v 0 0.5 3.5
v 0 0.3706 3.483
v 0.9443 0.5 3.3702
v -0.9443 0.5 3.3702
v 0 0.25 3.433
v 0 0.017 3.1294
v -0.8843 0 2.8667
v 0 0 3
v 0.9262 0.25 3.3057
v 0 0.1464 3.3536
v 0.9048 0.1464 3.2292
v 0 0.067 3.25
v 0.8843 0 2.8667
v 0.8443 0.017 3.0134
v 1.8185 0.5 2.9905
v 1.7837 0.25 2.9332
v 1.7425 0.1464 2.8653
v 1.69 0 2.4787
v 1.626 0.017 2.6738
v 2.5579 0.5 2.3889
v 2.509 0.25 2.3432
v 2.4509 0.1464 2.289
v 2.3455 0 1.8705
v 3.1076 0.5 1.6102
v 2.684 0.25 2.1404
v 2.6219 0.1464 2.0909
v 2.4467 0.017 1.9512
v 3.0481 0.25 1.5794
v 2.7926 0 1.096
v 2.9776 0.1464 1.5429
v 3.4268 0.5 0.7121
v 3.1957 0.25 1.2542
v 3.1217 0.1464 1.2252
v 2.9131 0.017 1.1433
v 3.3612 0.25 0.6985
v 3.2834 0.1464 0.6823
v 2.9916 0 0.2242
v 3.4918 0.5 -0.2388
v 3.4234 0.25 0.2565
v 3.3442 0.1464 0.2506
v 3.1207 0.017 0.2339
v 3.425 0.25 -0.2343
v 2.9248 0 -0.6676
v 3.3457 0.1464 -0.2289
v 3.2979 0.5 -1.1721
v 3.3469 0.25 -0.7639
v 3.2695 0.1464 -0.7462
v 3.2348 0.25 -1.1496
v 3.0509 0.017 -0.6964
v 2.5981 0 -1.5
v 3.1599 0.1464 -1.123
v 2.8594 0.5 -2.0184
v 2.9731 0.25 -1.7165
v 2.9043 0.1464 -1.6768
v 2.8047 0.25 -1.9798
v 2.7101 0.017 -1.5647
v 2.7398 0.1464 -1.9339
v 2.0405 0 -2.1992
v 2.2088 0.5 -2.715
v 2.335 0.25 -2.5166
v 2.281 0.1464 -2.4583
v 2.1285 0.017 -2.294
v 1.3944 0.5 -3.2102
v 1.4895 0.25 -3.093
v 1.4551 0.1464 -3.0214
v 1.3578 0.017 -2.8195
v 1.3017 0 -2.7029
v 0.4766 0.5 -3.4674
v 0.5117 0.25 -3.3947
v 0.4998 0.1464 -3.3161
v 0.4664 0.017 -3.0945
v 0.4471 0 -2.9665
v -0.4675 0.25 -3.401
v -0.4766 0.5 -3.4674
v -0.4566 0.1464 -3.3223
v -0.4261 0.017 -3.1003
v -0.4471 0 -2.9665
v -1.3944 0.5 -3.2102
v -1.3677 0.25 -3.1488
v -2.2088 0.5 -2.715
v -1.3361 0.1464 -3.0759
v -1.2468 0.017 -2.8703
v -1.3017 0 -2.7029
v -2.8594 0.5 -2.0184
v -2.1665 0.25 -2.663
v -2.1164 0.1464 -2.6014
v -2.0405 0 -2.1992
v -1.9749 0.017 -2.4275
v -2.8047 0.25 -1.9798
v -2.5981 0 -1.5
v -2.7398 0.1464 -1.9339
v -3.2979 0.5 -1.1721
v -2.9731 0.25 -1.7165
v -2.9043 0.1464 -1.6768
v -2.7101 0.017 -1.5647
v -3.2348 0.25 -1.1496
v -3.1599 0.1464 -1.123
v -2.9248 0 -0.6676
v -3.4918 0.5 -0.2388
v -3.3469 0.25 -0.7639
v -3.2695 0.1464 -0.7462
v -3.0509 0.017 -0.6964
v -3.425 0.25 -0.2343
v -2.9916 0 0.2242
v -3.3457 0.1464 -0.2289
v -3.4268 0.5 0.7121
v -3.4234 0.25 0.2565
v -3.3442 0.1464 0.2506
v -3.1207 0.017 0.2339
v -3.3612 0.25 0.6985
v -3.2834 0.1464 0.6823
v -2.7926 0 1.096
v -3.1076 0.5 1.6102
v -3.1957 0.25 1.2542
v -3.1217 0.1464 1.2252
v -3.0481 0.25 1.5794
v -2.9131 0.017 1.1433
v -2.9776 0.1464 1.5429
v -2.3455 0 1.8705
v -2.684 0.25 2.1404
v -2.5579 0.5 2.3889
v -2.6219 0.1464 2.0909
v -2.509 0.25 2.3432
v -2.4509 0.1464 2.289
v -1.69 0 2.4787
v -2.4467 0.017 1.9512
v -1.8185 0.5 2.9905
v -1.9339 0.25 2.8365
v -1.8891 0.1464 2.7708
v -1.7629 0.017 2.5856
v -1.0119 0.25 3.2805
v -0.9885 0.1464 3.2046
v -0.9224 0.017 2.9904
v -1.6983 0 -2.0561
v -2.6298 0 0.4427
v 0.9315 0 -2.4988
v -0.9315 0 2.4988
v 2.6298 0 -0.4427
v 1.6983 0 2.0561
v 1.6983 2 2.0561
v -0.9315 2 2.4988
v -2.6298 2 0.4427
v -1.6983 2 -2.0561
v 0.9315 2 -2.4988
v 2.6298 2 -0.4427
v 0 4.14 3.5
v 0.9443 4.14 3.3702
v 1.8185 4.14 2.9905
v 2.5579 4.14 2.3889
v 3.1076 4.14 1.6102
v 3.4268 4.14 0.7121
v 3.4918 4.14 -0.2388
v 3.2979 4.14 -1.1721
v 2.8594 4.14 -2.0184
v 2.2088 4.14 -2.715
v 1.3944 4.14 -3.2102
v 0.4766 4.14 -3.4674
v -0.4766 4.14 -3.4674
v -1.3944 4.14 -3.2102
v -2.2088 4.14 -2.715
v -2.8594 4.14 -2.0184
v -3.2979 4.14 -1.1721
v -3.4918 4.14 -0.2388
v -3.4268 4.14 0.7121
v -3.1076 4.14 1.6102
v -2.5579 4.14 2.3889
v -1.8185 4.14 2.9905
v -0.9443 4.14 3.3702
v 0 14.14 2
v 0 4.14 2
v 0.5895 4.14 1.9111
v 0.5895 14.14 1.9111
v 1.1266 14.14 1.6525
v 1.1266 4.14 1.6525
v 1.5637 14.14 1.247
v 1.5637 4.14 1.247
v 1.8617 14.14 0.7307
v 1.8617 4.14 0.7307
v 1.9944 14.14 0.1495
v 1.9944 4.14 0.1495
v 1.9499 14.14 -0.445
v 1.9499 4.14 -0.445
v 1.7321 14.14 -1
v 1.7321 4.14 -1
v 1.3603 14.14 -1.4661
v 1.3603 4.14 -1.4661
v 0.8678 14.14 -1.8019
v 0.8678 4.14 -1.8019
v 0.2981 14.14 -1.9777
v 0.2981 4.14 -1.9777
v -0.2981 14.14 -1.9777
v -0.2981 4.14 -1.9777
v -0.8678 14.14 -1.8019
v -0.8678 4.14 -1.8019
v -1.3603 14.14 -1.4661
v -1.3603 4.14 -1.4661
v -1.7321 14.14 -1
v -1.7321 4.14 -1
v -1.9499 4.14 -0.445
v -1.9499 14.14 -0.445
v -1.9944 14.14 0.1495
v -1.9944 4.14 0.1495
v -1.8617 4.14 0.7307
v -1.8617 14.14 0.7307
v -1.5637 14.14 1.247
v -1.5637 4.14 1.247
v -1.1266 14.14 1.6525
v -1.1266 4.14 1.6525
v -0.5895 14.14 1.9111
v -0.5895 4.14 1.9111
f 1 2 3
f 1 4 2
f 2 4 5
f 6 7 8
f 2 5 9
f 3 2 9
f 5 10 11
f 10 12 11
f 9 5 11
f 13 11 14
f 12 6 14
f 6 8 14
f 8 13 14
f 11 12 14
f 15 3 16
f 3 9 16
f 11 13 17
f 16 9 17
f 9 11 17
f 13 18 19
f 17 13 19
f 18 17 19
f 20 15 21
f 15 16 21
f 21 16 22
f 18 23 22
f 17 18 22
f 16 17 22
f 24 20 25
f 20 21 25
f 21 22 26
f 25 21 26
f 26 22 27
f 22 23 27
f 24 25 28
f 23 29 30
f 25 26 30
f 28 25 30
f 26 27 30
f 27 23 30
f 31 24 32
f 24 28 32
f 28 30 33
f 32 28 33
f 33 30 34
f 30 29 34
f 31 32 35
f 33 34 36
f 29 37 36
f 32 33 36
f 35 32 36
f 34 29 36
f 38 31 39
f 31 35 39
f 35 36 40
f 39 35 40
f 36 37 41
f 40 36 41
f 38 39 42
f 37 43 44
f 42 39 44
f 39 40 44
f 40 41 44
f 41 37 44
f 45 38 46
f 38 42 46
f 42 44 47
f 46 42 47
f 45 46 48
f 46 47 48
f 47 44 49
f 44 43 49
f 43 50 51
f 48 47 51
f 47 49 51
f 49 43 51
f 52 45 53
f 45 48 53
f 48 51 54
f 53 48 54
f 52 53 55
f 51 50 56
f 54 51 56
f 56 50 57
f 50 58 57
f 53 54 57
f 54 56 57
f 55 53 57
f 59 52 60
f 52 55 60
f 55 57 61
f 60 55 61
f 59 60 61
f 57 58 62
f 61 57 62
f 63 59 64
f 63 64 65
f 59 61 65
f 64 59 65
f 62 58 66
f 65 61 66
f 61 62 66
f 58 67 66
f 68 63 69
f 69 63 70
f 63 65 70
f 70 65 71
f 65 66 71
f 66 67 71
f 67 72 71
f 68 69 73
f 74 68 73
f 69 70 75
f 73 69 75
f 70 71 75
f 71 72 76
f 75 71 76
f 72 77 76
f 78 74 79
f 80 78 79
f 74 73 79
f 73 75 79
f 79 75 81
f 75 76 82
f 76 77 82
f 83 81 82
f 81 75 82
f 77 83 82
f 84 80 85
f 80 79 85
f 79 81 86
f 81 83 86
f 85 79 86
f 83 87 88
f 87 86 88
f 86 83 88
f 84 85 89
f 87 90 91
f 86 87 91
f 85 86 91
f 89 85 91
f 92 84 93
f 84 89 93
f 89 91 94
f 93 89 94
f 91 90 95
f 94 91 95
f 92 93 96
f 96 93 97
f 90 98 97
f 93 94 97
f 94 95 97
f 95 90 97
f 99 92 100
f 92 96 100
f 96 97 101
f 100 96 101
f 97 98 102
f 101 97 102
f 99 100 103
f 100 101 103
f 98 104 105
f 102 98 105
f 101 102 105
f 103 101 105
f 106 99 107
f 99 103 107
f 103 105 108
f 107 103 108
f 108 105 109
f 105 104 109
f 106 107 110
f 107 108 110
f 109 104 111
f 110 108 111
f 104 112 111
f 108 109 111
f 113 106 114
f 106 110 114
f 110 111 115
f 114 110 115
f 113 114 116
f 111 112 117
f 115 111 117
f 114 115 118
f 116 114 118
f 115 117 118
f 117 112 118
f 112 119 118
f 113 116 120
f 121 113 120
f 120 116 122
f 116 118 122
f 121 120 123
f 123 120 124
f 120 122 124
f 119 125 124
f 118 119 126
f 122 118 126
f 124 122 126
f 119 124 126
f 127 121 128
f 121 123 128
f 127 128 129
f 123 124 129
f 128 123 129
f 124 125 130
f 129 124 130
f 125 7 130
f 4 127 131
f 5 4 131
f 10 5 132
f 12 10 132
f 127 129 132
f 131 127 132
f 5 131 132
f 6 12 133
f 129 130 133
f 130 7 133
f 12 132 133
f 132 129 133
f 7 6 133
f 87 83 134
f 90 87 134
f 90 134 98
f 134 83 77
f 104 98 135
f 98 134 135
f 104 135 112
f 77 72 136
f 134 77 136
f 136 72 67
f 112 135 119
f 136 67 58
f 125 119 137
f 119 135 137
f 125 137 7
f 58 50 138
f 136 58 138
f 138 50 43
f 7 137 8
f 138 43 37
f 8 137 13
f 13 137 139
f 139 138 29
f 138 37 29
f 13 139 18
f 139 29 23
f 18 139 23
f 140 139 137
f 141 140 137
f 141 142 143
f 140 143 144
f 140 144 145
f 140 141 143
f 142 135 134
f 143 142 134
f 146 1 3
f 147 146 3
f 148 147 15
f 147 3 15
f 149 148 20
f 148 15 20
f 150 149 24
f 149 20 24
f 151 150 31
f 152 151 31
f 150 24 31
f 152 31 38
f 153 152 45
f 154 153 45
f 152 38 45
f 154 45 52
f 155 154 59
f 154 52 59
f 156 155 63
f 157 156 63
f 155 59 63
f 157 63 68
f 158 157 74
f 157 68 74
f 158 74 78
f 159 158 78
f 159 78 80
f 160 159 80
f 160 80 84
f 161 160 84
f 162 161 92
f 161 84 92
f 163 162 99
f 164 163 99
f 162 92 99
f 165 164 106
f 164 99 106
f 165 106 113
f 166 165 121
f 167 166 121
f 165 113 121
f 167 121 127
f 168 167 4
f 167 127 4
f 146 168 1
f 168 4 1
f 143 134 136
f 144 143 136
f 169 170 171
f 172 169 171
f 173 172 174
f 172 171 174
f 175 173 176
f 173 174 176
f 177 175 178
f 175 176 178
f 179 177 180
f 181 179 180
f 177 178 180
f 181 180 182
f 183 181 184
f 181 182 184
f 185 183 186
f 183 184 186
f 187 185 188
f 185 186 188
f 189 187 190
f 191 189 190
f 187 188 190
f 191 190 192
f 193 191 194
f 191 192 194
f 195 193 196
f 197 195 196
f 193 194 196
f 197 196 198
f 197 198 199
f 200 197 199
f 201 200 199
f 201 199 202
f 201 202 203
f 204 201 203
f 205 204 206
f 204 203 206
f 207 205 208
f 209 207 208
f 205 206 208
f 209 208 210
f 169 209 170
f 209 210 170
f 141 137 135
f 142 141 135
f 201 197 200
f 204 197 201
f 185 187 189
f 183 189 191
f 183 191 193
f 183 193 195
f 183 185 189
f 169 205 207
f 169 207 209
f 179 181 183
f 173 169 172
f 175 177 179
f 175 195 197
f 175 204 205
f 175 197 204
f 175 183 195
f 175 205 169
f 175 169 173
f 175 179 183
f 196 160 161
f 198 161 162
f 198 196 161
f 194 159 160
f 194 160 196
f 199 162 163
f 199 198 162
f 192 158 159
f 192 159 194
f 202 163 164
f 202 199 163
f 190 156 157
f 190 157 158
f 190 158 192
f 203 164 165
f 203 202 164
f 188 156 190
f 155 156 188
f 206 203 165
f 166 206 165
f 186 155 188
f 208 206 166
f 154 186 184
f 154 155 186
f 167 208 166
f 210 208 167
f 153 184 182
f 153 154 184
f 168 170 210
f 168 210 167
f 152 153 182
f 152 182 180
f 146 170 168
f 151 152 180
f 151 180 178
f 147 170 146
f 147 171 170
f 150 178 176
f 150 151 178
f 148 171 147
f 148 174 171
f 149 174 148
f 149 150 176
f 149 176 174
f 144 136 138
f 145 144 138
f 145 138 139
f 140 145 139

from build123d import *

# Parameters (mm, degrees)
SKETCH_1_R          = 3.5
EXTRUDE_1_DEPTH     = 4.14
SKETCH_2_R          = 2
EXTRUDE_2_DEPTH     = 10
FILLET_1_R          = 0.5
CUT_EXTRUDE_1_DEPTH = 2


with BuildPart() as part:
    # 草图1 → 凸台-拉伸1 (new body)
    with BuildSketch(Plane(origin=(0, 0, 0), x_dir=(1, 0, 0), z_dir=(0, 1, 0))):
        with Locations(Location((0, 0, 0), (0, 0, 270))):
            Circle(SKETCH_1_R)
    extrude(amount=EXTRUDE_1_DEPTH)

    # 草图2 → 凸台-拉伸2 (add)
    with BuildSketch(Plane(origin=(0, 4.14, 0), x_dir=(1, 0, 0), z_dir=(0, 1, 0))):
        with Locations(Location((0, 0, 0), (0, 0, 270))):
            Circle(SKETCH_2_R)
    extrude(amount=EXTRUDE_2_DEPTH)

    # 圆角1
    fillet_1_edges = [part.edges().sort_by_distance(p)[0] for p in [
        (0, 0, -3.5),
    ]]
    fillet(fillet_1_edges, radius=FILLET_1_R)

    # 草图3 → 切除-拉伸1 (cut)
    with BuildSketch(Plane.XZ):
        Polygon((1.698287208, 2.056072434), (-0.931467356, 2.498796082), (-2.629754564, 0.442723648), (-1.698287208, -2.056072434), (0.931467356, -2.498796082), (2.629754564, -0.442723648), align=None)
    extrude(amount=-CUT_EXTRUDE_1_DEPTH, mode=Mode.SUBTRACT)


solid = part.part
